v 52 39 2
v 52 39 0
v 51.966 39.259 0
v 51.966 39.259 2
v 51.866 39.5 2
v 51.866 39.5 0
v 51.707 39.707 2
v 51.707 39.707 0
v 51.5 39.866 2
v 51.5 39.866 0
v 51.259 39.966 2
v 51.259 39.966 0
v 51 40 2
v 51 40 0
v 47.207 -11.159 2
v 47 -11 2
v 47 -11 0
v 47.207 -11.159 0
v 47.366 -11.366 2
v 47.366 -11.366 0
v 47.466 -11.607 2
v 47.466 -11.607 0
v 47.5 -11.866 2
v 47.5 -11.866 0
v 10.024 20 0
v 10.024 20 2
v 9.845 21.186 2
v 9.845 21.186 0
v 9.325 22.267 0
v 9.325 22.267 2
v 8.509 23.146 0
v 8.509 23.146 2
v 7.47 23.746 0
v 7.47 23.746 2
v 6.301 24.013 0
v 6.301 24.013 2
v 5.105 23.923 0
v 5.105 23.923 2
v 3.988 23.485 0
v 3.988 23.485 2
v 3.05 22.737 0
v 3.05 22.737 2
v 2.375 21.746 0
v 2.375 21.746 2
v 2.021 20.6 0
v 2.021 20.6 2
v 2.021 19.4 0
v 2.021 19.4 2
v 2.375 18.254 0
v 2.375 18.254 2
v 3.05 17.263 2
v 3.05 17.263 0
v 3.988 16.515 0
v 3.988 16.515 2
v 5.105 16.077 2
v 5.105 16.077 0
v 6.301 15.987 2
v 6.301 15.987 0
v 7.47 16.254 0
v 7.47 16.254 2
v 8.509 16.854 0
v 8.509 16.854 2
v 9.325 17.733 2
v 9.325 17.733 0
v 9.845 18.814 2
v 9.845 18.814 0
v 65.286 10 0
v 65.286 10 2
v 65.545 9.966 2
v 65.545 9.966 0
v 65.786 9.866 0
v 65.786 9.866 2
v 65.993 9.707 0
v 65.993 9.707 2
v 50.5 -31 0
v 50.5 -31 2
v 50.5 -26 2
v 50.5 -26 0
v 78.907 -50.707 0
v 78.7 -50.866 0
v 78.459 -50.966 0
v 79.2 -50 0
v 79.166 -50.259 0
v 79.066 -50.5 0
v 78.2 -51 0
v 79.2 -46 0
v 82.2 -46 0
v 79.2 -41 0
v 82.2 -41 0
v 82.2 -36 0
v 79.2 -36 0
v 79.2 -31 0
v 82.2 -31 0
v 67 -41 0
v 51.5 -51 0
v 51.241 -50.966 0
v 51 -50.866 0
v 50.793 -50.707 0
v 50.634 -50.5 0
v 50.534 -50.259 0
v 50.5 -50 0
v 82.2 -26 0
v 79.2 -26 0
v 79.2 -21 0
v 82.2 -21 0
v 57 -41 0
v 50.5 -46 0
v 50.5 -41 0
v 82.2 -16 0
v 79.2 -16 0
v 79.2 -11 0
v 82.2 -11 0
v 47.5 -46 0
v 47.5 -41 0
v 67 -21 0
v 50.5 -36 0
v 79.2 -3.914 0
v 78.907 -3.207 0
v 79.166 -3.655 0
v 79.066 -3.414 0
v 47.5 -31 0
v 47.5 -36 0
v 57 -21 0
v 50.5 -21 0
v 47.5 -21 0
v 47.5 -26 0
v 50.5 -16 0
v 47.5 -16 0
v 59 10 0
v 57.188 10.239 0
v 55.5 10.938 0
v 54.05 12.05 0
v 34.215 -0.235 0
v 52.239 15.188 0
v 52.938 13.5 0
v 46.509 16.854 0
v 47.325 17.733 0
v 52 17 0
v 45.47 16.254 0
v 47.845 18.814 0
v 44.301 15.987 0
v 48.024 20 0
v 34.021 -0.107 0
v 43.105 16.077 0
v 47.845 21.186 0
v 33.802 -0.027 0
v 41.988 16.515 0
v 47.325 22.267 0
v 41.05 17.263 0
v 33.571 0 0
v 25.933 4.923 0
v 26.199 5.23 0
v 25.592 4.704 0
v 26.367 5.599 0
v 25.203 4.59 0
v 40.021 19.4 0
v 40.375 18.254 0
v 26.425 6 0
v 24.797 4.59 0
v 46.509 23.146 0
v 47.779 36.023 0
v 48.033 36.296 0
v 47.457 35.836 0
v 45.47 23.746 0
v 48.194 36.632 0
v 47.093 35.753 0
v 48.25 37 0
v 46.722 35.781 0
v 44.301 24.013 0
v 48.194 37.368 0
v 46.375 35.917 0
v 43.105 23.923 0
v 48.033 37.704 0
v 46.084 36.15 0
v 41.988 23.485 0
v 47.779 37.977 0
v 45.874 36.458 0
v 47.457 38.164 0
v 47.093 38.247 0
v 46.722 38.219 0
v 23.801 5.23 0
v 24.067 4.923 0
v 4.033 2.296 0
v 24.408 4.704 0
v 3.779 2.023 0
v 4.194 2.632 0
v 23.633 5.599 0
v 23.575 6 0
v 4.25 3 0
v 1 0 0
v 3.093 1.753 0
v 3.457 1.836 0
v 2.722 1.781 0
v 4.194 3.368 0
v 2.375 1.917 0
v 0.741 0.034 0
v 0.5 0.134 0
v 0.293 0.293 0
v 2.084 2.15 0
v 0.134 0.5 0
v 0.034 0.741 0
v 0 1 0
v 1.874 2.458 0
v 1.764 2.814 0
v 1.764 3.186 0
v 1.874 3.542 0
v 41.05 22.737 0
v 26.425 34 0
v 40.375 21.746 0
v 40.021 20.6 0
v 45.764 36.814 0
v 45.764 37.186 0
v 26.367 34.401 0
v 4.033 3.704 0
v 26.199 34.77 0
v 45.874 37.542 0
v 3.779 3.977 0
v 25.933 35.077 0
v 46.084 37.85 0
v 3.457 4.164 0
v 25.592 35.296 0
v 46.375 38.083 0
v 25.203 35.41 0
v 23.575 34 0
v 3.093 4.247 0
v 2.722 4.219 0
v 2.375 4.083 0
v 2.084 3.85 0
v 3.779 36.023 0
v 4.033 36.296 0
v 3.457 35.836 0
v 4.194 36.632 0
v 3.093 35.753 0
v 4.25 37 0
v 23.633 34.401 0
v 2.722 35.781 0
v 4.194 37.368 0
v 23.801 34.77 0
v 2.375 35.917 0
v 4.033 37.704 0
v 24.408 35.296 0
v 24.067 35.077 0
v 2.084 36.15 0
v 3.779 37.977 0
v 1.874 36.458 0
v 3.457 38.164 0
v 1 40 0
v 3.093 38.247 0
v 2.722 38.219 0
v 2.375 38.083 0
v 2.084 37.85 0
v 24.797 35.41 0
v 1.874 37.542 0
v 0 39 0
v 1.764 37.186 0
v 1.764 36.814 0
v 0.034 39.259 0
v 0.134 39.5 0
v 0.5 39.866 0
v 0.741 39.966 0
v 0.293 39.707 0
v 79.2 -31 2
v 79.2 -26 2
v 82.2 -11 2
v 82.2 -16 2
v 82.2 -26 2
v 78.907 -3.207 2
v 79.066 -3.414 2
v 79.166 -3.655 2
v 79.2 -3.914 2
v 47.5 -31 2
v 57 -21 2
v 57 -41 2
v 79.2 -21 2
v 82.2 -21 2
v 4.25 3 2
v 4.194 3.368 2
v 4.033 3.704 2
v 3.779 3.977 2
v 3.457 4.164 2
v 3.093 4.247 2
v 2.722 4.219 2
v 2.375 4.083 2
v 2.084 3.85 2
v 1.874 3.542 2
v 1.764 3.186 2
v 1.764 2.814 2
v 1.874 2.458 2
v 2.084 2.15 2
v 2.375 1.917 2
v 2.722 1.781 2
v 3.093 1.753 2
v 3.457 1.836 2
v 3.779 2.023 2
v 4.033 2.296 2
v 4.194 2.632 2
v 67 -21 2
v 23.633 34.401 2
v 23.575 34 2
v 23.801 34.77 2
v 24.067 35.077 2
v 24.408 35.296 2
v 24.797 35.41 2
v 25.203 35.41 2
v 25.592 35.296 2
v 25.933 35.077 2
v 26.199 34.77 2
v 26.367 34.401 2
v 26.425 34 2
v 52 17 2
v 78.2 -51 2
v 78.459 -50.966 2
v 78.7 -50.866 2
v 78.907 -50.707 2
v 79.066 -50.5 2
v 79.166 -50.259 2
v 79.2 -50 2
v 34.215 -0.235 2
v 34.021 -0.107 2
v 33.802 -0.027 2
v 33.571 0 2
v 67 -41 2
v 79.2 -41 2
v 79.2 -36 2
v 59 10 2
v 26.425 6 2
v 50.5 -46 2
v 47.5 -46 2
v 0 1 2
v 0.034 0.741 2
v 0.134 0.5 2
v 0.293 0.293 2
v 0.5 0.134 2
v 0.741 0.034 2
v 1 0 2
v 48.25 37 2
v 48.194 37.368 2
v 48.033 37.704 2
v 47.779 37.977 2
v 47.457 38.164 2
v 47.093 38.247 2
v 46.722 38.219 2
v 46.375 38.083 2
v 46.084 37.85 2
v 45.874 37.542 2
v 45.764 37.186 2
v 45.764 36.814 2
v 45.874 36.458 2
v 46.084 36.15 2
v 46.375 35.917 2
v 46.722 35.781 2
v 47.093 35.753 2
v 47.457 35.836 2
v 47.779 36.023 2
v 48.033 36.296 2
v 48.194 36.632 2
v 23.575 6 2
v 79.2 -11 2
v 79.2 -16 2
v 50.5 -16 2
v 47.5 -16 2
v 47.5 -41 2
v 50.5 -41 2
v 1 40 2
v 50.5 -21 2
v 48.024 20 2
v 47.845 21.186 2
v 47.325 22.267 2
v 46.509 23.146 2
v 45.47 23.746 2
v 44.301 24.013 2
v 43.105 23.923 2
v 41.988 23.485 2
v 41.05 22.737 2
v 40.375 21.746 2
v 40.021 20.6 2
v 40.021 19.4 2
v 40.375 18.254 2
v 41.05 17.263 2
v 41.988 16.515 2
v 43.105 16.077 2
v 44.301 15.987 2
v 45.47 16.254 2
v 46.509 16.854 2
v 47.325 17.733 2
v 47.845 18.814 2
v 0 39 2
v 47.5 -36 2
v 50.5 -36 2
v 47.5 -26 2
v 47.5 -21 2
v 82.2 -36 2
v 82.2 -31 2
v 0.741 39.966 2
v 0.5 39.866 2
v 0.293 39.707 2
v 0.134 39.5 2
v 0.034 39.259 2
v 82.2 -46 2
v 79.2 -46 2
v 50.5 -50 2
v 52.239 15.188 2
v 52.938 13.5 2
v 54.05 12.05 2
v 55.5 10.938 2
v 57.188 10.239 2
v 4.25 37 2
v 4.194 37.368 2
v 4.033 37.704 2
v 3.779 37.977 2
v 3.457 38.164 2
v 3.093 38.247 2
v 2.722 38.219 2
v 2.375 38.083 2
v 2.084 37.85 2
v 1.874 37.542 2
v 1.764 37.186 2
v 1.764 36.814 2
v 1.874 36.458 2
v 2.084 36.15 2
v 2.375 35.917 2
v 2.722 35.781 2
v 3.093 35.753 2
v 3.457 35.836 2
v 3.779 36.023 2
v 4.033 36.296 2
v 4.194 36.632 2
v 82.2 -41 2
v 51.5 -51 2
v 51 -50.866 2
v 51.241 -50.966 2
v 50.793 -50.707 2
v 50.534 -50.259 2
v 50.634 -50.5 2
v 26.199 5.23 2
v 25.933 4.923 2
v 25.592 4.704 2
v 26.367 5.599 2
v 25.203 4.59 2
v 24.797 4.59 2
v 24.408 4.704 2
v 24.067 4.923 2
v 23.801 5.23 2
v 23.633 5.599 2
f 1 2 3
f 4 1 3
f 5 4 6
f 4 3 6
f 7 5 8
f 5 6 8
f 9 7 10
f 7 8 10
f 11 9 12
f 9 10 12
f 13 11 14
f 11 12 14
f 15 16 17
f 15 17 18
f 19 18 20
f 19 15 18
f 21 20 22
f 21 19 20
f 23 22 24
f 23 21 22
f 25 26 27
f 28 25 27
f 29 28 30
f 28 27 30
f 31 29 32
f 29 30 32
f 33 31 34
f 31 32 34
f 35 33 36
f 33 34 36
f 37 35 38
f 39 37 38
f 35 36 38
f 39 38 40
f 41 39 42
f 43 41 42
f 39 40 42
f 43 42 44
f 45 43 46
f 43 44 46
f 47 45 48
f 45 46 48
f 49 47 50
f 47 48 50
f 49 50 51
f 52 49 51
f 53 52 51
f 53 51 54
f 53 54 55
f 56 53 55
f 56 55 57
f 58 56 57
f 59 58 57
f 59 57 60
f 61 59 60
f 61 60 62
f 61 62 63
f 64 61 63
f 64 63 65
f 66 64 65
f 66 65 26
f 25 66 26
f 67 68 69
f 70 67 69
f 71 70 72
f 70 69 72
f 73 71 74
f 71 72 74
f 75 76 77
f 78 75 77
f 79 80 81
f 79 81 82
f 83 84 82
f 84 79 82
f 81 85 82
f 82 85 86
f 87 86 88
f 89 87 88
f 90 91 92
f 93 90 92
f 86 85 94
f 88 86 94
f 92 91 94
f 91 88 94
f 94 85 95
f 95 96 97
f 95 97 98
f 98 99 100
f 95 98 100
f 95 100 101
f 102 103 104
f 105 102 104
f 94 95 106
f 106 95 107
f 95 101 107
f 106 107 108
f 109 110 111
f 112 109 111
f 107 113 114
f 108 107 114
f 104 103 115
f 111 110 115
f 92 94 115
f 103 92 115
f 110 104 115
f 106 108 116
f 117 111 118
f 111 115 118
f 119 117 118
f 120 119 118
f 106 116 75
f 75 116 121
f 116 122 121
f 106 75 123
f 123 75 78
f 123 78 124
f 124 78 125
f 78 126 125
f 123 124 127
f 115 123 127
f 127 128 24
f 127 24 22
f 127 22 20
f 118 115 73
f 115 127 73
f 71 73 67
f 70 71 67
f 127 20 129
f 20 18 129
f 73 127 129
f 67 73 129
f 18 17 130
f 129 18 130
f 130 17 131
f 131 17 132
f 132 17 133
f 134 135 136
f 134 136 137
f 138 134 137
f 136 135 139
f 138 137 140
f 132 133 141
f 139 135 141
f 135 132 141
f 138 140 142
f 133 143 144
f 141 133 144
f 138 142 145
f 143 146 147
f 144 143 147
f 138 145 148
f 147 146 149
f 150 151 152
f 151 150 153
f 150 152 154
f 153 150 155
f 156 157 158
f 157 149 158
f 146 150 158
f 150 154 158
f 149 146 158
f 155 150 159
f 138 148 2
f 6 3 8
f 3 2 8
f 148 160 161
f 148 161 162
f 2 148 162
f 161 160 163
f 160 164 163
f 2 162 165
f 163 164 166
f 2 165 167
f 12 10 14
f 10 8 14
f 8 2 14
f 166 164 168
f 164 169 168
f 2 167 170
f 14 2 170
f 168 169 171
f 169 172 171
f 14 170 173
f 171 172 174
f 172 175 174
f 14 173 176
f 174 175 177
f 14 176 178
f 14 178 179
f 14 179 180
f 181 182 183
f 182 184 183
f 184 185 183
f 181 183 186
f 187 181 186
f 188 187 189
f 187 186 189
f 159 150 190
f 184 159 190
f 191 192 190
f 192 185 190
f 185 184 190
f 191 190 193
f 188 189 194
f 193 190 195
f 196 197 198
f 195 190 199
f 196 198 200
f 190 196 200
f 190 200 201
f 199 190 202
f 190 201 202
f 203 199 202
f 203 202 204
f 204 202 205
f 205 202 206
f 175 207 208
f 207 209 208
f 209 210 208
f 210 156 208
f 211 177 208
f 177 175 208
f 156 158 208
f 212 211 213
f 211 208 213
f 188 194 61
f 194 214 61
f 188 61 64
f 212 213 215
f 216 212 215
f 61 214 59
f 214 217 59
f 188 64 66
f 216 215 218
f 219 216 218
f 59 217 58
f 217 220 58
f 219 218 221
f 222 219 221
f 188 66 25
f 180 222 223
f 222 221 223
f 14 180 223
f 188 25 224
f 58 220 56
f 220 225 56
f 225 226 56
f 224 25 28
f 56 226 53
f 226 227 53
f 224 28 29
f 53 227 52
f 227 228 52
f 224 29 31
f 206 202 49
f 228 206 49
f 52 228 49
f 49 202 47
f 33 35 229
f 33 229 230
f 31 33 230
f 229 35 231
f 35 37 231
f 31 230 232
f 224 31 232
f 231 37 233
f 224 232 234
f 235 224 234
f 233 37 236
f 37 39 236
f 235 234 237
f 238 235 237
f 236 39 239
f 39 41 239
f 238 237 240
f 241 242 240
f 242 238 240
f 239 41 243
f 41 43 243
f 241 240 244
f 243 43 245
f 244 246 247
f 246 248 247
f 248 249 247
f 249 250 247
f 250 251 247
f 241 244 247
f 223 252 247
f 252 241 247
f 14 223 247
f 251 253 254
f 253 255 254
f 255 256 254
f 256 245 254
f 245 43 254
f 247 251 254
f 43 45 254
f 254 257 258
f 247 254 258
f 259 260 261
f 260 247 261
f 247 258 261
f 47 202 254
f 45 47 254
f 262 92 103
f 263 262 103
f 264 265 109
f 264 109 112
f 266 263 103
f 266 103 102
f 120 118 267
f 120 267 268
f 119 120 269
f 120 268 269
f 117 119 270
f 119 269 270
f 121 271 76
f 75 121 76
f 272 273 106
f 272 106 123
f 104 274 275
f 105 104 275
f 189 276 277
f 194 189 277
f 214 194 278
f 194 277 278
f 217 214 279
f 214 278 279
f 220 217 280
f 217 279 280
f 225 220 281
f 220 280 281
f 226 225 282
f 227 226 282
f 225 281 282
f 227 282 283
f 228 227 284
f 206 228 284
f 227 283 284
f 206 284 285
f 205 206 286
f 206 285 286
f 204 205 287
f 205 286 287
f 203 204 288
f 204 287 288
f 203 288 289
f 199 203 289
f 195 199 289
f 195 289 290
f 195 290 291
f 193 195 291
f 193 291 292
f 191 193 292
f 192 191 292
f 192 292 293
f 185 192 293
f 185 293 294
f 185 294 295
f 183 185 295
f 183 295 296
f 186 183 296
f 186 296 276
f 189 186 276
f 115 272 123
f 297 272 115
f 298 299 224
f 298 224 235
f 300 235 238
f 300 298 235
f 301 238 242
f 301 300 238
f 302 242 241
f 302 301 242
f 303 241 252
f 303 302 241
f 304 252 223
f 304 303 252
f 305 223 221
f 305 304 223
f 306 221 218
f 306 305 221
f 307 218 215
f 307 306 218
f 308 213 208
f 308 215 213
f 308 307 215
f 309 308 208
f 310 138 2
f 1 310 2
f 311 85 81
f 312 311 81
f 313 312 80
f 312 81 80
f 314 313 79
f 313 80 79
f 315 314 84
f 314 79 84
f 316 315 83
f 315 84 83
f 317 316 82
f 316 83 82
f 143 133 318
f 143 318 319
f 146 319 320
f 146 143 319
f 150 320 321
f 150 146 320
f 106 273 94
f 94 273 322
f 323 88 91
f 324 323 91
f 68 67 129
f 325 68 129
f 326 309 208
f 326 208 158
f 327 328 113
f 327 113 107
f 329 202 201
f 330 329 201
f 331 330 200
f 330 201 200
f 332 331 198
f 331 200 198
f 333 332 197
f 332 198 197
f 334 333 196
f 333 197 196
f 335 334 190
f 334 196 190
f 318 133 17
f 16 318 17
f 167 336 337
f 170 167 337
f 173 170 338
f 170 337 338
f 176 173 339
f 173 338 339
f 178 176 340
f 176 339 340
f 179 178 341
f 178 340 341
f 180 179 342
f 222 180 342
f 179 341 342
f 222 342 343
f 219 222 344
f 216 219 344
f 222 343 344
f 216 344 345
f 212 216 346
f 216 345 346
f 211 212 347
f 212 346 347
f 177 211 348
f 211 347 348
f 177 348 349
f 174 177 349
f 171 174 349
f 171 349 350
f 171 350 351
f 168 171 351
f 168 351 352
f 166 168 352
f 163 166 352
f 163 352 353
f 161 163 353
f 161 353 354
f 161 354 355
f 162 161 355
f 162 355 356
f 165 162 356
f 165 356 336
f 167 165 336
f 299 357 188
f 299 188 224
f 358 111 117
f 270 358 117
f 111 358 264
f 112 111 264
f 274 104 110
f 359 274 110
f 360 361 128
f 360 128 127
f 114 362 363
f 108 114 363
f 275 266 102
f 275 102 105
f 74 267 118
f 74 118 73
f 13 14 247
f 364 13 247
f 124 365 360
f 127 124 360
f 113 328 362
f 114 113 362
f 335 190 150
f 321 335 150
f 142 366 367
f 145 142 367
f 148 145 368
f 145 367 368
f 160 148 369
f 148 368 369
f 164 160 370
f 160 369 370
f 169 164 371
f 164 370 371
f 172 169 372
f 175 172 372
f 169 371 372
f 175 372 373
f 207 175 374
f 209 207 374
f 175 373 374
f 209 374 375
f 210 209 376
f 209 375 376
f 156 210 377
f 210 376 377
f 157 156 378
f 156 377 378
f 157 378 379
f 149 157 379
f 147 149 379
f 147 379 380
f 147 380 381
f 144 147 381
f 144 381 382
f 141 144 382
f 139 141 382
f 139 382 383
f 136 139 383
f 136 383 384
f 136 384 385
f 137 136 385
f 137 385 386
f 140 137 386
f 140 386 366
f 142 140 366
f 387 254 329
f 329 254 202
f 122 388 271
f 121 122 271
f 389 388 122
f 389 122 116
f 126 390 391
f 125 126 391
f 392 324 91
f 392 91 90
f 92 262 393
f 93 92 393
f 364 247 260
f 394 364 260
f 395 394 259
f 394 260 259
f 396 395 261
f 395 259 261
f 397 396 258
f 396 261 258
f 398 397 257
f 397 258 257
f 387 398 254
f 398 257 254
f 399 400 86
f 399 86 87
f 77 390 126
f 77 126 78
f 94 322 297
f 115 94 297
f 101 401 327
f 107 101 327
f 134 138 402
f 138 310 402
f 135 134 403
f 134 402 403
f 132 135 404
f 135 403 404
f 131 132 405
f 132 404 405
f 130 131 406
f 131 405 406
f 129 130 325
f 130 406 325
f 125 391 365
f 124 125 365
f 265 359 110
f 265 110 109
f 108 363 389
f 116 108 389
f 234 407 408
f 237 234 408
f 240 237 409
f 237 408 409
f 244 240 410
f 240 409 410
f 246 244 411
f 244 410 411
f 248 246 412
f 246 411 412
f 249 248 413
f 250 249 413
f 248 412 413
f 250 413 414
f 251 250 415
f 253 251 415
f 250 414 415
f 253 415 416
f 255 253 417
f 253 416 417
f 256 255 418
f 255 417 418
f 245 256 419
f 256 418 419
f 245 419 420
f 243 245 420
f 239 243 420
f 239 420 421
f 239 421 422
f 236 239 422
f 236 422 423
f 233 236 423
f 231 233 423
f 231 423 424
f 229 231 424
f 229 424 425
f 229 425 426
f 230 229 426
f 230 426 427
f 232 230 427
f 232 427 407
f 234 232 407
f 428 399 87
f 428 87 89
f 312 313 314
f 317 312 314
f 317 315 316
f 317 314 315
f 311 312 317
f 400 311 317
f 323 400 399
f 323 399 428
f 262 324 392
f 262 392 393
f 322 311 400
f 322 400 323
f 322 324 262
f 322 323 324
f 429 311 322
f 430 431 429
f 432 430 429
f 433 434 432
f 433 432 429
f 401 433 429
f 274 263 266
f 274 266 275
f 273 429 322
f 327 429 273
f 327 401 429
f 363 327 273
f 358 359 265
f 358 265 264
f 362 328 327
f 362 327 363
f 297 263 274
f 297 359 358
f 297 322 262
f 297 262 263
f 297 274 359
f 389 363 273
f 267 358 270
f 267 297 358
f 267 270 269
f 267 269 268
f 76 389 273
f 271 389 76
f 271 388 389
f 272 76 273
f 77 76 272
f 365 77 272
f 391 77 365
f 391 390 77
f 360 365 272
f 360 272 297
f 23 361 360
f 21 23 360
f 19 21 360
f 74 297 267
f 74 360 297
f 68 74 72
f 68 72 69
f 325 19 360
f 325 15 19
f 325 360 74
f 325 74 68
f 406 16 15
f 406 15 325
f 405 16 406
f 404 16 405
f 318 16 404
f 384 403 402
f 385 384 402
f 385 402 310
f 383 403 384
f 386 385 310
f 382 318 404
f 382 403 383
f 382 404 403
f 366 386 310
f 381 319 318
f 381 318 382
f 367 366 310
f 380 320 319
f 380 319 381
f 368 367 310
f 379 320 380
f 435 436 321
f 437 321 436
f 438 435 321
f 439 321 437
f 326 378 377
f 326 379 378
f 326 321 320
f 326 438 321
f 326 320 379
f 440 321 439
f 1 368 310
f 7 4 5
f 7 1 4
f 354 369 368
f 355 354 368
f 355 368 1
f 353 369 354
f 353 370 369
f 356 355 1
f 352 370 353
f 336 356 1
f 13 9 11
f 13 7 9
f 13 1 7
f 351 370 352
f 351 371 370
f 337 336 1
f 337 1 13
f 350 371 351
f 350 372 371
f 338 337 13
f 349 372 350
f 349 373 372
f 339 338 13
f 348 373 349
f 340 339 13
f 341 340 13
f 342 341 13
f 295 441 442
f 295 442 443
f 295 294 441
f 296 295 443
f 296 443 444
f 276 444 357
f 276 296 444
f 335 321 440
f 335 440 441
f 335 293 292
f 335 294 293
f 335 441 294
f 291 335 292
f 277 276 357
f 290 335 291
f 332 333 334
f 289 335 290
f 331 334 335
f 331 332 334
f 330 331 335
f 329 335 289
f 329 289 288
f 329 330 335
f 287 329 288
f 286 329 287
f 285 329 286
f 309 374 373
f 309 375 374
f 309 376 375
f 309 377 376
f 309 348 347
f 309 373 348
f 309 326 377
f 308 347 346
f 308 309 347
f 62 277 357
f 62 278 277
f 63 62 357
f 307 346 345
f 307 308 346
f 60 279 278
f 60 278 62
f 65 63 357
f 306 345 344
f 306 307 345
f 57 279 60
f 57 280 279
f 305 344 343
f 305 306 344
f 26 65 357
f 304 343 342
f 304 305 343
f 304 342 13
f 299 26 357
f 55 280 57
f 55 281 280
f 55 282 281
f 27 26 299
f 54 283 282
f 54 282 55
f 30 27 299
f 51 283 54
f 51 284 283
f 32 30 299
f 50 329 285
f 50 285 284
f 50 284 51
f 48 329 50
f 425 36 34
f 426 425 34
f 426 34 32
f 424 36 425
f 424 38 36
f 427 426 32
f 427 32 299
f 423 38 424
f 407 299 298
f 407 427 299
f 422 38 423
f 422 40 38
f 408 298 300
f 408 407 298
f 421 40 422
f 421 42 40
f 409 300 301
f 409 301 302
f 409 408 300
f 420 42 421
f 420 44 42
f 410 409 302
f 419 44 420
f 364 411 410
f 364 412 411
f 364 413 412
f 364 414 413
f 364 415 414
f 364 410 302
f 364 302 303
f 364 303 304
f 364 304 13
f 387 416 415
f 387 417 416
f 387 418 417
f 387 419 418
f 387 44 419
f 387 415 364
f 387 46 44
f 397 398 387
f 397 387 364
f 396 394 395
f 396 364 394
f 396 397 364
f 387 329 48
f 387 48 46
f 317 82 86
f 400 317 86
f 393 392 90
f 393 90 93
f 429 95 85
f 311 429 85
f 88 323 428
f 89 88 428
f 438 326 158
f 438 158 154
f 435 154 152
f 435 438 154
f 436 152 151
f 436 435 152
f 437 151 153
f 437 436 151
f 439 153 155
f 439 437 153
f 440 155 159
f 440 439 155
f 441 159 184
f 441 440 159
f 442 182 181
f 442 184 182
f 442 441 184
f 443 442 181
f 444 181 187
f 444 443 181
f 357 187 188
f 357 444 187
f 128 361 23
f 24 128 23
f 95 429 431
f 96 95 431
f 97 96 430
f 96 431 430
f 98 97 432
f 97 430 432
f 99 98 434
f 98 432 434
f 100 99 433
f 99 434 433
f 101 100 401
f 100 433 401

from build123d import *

# Parameters (mm, degrees)
PLATE_BODY_DEPTH          = 2
SKETCH2_R                 = 4.0238
SHAFT_BEARINGS_DEPTH      = 95.22122903
SLOT_DEPTH                = 95.22122903
SKETCH5_R                 = 1.25
BOLT_HOLES_DEPTH          = 95.22122903
SKETCH6_W                 = 0.5
SKETCH6_H                 = 40
CUT_EXTRUDE1_DEPTH        = 95.22122903
SKETCH8_W                 = 3
SKETCH8_H                 = 5
FINGER_JOINTS_DEPTH       = 2
SKETCH9_W                 = 10
SKETCH9_H                 = 20
GEAR_HOLE_DEPTH           = 97.756601842
CUT_EXTRUDE3_DEPTH        = 10
F_1MM_FILLETS_GEAR_HOLE_R = 1
F_7MM_FILLET_GEAR_HOLE_R  = 7


with BuildPart() as part:
    # Sketch1 → plate_body (new body)
    with BuildSketch(Plane.XY):
        Polygon((0, 40), (0, 0), (33.935876329, 0), (47, -11), (50, -11), (50, -51), (79.2, -51), (79.2, 10), (52, 10), (52, 40), align=None)
    extrude(amount=PLATE_BODY_DEPTH)

    # Sketch2 → shaft_bearings (cut, through all)
    with BuildSketch(Plane.XY.offset(2)):
        with Locations((6, 20)):
            Circle(SKETCH2_R)
        with Locations((44, 20)):
            Circle(SKETCH2_R)
    extrude(amount=-SHAFT_BEARINGS_DEPTH, mode=Mode.SUBTRACT)

    # Sketch4 → slot (cut, through all)
    with BuildSketch(Plane.XY.offset(2)):
        with BuildLine():
            Line((26.425, 34), (26.425, 6))
            ThreePointArc((26.425, 6), (25, 4.575), (23.575, 6))
            Line((23.575, 6), (23.575, 34))
            ThreePointArc((23.575, 34), (25, 35.425), (26.425, 34))
        make_face()
    extrude(amount=-SLOT_DEPTH, mode=Mode.SUBTRACT)

    # Sketch5 → bolt_holes (cut, through all)
    with BuildSketch(Plane.XY.offset(2)):
        with Locations((3, 37)):
            Circle(SKETCH5_R)
        with Locations((47, 37)):
            Circle(SKETCH5_R)
        with Locations((3, 3)):
            Circle(SKETCH5_R)
    extrude(amount=-BOLT_HOLES_DEPTH, mode=Mode.SUBTRACT)

    # Sketch6 → Cut-Extrude1 (cut, through all)
    with BuildSketch(Plane.XY.offset(2)):
        with Locations((50.25, -31)):
            Rectangle(SKETCH6_W, SKETCH6_H)
    extrude(amount=-CUT_EXTRUDE1_DEPTH, mode=Mode.SUBTRACT)

    # Sketch8 → finger_joints (add)
    with BuildSketch(Plane.XY.offset(2)):
        with Locations((49, -33.5)):
            Rectangle(SKETCH8_W, SKETCH8_H)
        with Locations((49, -43.5)):
            Rectangle(SKETCH8_W, SKETCH8_H)
        with Locations((80.7, -43.5)):
            Rectangle(SKETCH8_W, SKETCH8_H)
        with Locations((80.7, -33.5)):
            Rectangle(SKETCH8_W, SKETCH8_H)
        with Locations((49, -13.5)):
            Rectangle(SKETCH8_W, SKETCH8_H)
        with Locations((49, -23.5)):
            Rectangle(SKETCH8_W, SKETCH8_H)
        with Locations((80.7, -23.5)):
            Rectangle(SKETCH8_W, SKETCH8_H)
        with Locations((80.7, -13.5)):
            Rectangle(SKETCH8_W, SKETCH8_H)
    extrude(amount=-FINGER_JOINTS_DEPTH)

    # Sketch9 → gear_hole (cut, through all)
    with BuildSketch(Plane.XY.offset(2)):
        with Locations((62, -31)):
            Rectangle(SKETCH9_W, SKETCH9_H)
    extrude(amount=-GEAR_HOLE_DEPTH, mode=Mode.SUBTRACT)

    # Sketch12 → Cut-Extrude3 (cut)
    with BuildSketch(Plane.XY.offset(2)):
        Polygon((79.2, 10), (79.2, -3.5), (65.7, 10), align=None)
    extrude(amount=-CUT_EXTRUDE3_DEPTH, mode=Mode.SUBTRACT)

    # 1mm_fillets_gear_hole
    # the kernel refuses this fillet: 1 mm, written as the material it adds along each edge
    with BuildSketch(Plane(origin=(33.935876329, 0, 0), x_dir=(-1, 0, 0), z_dir=(0, 0, 1))) as f_1mm_fillets_gear_hole_piece_1:
        with BuildLine():
            CenterArc((F_1MM_FILLETS_GEAR_HOLE_R * 0.364933095837, F_1MM_FILLETS_GEAR_HOLE_R), F_1MM_FILLETS_GEAR_HOLE_R, 229.902601193, 40.097398807)
            Line((-F_1MM_FILLETS_GEAR_HOLE_R * 0.279155806295, F_1MM_FILLETS_GEAR_HOLE_R * 0.23504935705), (0, 0))
            Line((0, 0), (F_1MM_FILLETS_GEAR_HOLE_R * 0.364933095837, 0))
        make_face()
    extrude(amount=2)
    with BuildSketch(Plane(origin=(47.5, -11, 2), x_dir=(0, -1, 0), z_dir=(0, 0, -1))) as f_1mm_fillets_gear_hole_piece_2:
        with BuildLine():
            CenterArc((0.866025404, 1), F_1MM_FILLETS_GEAR_HOLE_R, 210, 60)
            Line((0, 0.5), (0, 0))
            Line((0, 0), (0.866025404, 0))
        make_face()
    extrude(amount=2)
    # the kernel refuses this fillet: 1 mm, written as the material it takes off along each edge
    with BuildSketch(Plane(origin=(0, 0, -2.5), x_dir=(0, 1, 0), z_dir=(0, 0, 1)), Plane(origin=(50.5, -51, 4.5), x_dir=(1, 0, 0), z_dir=(0, 0, -1))) as f_1mm_fillets_gear_hole_2_piece_1:
        with BuildLine():
            CenterArc((F_1MM_FILLETS_GEAR_HOLE_R, -F_1MM_FILLETS_GEAR_HOLE_R), F_1MM_FILLETS_GEAR_HOLE_R, 90, 90)
            Line((0, -F_1MM_FILLETS_GEAR_HOLE_R), (0, 0))
            Line((0, 0), (F_1MM_FILLETS_GEAR_HOLE_R, 0))
        make_face()
    extrude(amount=7, mode=Mode.SUBTRACT)
    with BuildSketch(Plane(origin=(0, 40, -2.5), x_dir=(0, -1, 0), z_dir=(0, 0, 1)), Plane(origin=(52, 40, -2.5), x_dir=(-1, 0, 0), z_dir=(0, 0, 1)), Plane(origin=(79.2, -51, -2.5), x_dir=(0, 1, 0), z_dir=(0, 0, 1))) as f_1mm_fillets_gear_hole_2_piece_2:
        with BuildLine():
            CenterArc((F_1MM_FILLETS_GEAR_HOLE_R, F_1MM_FILLETS_GEAR_HOLE_R), F_1MM_FILLETS_GEAR_HOLE_R, 180, 90)
            Line((0, F_1MM_FILLETS_GEAR_HOLE_R), (0, 0))
            Line((0, 0), (F_1MM_FILLETS_GEAR_HOLE_R, 0))
        make_face()
    extrude(amount=7, mode=Mode.SUBTRACT)
    with BuildSketch(Plane(origin=(79.2, -3.5, 3.035533906), x_dir=(-0.7071067811865523, 0.7071067811865427, 0), z_dir=(0, 0, -1)), Plane(origin=(65.7, 10, 3.035533906), x_dir=(-1, 0, 0), z_dir=(0, 0, -1))) as f_1mm_fillets_gear_hole_2_piece_3:
        with BuildLine():
            CenterArc((F_1MM_FILLETS_GEAR_HOLE_R * 0.414213562373, -F_1MM_FILLETS_GEAR_HOLE_R), F_1MM_FILLETS_GEAR_HOLE_R, 90, 45)
            Line((-F_1MM_FILLETS_GEAR_HOLE_R * 0.292893218813, -F_1MM_FILLETS_GEAR_HOLE_R * 0.292893218813), (0, 0))
            Line((0, 0), (F_1MM_FILLETS_GEAR_HOLE_R * 0.414213562373, 0))
        make_face()
    extrude(amount=4.071067812, mode=Mode.SUBTRACT)

    # 7mm_fillet_gear_hole
    f_7mm_fillet_gear_hole_edges = [part.edges().sort_by_distance(p)[0] for p in [
        (52, 10, 1),
    ]]
    fillet(f_7mm_fillet_gear_hole_edges, radius=F_7MM_FILLET_GEAR_HOLE_R)


solid = part.part
